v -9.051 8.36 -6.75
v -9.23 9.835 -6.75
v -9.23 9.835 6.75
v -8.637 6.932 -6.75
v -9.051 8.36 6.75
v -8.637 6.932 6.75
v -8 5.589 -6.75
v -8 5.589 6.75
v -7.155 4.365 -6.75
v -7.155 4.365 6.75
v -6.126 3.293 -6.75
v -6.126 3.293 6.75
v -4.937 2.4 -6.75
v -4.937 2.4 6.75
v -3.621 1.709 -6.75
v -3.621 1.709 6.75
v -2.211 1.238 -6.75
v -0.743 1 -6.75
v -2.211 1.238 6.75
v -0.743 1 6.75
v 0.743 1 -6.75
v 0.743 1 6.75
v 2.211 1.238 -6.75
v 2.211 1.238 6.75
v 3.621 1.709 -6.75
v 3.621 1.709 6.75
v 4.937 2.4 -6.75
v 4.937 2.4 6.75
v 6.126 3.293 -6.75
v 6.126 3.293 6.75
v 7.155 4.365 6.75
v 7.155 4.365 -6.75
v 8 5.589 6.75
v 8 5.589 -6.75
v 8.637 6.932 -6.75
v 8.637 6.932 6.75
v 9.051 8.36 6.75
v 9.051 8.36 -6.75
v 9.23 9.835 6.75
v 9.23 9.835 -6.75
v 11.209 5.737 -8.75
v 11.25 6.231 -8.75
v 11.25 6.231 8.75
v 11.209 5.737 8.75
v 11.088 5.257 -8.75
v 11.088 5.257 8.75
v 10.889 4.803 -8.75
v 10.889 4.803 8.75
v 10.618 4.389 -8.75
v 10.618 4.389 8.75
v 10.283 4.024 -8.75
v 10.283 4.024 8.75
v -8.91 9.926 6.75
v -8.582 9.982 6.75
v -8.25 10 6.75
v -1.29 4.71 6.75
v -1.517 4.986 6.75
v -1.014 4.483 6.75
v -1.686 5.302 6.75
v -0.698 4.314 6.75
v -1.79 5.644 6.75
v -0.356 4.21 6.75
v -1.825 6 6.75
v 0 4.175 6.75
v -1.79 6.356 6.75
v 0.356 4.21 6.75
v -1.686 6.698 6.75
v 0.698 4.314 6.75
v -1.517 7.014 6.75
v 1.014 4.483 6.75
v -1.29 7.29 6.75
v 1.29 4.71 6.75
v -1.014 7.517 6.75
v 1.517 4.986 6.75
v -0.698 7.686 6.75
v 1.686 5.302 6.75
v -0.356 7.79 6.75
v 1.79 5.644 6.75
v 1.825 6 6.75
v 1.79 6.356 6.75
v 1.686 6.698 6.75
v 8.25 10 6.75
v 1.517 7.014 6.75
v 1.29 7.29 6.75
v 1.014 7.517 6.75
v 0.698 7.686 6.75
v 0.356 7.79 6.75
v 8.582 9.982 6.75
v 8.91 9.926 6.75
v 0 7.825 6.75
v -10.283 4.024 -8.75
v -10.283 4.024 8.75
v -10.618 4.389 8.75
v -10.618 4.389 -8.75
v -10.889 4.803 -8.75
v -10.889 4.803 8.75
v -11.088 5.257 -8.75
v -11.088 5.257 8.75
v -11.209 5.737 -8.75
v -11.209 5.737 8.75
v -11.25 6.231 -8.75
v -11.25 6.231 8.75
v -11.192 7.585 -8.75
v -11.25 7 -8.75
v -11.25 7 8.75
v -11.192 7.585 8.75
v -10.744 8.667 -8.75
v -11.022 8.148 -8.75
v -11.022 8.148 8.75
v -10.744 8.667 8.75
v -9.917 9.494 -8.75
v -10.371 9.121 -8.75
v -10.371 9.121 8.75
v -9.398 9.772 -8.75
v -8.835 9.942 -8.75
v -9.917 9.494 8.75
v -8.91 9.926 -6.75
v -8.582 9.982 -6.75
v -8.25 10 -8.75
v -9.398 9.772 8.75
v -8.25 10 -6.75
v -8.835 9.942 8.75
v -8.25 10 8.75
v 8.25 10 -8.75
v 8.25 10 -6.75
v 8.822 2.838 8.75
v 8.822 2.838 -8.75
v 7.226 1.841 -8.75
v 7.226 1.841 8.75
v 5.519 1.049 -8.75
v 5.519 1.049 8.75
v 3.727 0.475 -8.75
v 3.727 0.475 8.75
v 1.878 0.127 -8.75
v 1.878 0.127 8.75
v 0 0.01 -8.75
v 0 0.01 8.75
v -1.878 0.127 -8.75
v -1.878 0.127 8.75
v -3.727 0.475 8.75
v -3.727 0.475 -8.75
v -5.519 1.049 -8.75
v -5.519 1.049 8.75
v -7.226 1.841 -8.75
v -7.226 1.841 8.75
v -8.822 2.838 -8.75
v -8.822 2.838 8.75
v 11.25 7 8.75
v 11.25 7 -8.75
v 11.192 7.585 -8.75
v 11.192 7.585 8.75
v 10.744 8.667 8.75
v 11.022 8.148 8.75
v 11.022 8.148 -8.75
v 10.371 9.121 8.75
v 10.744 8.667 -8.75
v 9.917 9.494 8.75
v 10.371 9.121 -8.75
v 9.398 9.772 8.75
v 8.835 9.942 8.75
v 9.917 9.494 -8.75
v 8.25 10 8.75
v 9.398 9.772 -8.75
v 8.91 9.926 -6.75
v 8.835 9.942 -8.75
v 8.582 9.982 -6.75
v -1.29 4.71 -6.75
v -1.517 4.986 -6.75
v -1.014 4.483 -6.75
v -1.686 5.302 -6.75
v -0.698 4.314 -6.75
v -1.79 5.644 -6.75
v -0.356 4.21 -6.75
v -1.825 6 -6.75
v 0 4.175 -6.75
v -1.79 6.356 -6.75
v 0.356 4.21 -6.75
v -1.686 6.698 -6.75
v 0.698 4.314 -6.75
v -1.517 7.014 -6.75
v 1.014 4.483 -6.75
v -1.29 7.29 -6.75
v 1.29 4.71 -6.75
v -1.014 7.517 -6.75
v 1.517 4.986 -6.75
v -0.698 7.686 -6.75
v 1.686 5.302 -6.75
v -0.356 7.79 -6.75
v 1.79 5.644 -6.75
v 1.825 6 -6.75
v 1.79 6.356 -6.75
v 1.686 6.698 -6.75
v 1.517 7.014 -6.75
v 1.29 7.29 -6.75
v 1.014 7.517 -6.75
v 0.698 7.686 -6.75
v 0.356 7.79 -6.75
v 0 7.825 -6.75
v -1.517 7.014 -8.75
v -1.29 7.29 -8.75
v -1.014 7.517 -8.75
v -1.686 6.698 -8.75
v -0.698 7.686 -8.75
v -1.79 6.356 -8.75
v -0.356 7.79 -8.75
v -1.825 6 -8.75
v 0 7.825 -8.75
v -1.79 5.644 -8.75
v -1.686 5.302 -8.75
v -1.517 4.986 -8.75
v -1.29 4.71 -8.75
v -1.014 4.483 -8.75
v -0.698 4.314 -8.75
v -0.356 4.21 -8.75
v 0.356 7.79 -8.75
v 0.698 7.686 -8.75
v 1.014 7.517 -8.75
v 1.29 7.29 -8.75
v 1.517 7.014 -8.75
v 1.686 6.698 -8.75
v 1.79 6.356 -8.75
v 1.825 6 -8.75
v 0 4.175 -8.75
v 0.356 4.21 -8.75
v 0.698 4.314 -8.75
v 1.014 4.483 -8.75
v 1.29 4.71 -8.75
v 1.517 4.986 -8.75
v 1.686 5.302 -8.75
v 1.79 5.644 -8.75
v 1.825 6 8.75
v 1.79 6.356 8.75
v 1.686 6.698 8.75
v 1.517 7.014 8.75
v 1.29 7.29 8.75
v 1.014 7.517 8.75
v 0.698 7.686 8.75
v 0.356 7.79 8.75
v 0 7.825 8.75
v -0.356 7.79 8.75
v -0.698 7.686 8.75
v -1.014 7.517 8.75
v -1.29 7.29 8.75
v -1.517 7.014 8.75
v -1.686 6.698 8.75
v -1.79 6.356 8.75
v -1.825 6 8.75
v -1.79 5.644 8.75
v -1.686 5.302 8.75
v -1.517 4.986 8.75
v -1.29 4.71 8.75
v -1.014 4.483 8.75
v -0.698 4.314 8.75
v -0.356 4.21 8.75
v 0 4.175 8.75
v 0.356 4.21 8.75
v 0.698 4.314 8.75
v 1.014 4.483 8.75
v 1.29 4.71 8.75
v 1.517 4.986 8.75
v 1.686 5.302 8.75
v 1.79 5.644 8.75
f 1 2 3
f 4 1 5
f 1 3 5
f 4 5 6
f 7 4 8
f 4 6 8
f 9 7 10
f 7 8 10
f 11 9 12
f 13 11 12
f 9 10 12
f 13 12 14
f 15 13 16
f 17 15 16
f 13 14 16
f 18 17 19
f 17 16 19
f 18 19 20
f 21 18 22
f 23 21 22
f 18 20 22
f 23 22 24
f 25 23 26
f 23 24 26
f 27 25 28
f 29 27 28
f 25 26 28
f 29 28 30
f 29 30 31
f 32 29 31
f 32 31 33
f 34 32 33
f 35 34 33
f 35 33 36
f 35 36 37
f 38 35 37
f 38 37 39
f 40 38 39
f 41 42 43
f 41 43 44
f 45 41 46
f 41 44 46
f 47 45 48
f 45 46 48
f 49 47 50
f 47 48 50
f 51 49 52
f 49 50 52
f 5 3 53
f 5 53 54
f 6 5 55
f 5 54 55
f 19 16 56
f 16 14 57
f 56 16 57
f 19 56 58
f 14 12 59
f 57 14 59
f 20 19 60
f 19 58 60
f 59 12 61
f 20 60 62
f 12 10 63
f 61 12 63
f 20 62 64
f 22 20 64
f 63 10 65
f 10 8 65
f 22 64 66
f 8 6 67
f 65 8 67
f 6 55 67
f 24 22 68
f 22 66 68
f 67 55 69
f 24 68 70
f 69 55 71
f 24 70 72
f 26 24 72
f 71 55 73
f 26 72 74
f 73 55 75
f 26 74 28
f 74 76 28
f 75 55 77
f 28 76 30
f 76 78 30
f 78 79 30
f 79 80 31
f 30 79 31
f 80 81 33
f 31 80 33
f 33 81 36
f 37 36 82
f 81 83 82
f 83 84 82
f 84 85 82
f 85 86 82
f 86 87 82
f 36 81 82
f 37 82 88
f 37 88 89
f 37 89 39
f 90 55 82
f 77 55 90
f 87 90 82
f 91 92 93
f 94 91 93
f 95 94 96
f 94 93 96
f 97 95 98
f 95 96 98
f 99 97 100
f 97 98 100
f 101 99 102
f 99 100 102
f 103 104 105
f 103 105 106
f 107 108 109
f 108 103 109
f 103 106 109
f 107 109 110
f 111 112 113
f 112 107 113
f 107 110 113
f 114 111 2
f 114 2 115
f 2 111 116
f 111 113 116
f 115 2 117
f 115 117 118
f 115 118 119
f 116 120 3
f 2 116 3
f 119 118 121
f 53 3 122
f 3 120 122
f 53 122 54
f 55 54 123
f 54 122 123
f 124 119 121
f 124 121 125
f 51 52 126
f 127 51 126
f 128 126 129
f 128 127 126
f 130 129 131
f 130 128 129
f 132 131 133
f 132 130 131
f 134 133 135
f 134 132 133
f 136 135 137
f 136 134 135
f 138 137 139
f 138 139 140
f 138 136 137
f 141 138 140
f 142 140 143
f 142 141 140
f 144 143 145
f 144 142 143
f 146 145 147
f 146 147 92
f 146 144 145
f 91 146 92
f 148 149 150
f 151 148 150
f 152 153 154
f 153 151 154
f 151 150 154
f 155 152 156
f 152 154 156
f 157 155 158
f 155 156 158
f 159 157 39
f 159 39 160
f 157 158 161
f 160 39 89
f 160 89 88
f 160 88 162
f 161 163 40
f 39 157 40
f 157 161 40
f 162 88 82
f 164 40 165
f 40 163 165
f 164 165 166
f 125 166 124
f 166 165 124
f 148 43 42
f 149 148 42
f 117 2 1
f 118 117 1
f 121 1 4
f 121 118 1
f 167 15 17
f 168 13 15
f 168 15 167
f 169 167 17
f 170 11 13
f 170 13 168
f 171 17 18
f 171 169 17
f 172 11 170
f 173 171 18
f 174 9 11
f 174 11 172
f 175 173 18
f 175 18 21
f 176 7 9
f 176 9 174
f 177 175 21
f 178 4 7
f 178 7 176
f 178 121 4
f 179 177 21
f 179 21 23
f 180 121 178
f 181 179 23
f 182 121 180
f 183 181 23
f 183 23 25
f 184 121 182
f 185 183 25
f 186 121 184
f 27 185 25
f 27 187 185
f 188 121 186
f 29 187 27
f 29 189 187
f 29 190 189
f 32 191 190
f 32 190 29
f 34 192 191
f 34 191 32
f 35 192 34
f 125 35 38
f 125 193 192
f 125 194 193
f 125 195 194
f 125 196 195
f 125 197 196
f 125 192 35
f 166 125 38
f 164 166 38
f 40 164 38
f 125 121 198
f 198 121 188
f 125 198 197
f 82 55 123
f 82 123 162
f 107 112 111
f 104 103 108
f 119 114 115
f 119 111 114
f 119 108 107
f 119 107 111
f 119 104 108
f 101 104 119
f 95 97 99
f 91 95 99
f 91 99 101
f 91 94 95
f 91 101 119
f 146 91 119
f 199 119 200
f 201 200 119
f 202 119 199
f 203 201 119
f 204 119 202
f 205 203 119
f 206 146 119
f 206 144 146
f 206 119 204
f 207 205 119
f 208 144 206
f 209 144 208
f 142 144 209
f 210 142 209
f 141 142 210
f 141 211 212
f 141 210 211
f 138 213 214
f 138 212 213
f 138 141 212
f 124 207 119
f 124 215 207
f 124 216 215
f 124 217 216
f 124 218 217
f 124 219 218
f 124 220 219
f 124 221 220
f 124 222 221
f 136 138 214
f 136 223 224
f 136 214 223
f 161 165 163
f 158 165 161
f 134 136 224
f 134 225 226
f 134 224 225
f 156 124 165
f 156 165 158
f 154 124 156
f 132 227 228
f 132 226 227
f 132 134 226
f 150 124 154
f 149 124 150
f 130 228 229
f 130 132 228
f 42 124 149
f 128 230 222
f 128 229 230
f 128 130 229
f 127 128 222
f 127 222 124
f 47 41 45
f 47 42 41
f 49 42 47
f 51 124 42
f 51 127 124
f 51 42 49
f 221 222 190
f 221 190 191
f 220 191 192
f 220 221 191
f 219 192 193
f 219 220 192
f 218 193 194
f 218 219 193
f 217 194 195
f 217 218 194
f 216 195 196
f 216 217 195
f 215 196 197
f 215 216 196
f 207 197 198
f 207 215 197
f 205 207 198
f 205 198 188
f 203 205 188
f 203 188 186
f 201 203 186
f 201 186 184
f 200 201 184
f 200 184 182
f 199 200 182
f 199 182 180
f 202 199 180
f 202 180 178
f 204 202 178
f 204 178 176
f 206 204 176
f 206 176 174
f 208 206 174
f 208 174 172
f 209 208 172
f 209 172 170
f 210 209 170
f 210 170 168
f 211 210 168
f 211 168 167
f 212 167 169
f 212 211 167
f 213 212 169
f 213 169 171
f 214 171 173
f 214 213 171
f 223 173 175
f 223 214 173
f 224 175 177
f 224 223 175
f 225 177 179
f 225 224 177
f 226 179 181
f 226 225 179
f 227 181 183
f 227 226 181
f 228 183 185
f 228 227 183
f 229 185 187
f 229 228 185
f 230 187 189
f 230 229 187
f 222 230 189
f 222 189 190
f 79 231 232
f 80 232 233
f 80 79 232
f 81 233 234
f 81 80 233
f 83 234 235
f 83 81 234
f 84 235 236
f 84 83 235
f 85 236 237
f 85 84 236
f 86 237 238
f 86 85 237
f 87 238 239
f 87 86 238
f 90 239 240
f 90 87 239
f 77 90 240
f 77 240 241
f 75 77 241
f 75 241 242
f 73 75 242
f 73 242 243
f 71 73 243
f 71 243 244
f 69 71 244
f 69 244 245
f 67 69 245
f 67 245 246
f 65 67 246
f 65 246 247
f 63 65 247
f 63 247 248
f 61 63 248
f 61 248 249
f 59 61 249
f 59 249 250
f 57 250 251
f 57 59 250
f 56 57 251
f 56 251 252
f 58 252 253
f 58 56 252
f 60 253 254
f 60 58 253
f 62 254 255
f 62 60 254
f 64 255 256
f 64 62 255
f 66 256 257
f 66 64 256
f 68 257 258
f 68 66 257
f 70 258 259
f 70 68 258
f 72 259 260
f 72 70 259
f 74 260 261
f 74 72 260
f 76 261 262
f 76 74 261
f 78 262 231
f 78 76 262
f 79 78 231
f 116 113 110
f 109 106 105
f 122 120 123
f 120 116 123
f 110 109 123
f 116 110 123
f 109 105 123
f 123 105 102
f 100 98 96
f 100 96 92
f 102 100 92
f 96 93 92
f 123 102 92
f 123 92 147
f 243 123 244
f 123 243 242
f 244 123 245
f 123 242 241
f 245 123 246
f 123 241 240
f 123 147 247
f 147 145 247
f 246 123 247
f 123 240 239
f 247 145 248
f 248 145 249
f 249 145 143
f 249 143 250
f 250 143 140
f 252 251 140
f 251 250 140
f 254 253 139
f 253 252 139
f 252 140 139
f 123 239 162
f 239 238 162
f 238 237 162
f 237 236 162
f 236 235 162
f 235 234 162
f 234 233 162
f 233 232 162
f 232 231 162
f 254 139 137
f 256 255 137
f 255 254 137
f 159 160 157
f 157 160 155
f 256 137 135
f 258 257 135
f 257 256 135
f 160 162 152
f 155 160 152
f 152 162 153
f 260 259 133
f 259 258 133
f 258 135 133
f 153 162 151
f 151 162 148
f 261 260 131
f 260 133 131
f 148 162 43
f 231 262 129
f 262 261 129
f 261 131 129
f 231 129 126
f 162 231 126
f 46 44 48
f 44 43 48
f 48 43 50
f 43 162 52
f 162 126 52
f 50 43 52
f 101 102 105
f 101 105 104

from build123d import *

# Parameters (mm, degrees)
SKETCH1_W               = 22.5
SKETCH1_H               = 17.5
BOSS_EXTRUDE1_DEPTH     = 10
CUT_EXTRUDE1_DEPTH      = 24.082731641
CUT_EXTRUDE1_DEPTH_BACK = 24.082731641
SKETCH2_R               = 1.825
CUT_EXTRUDE2_DEPTH      = 13.5
CUT_EXTRUDE3_REACH      = 19.405
SKETCH4_W               = 11.529065942
SKETCH4_H               = 13.5
FILLET1_R               = 3


with BuildPart() as part:
    # Sketch1 → Boss-Extrude1 (new body)
    with BuildSketch(Plane(origin=(0, 0, 0), x_dir=(1, 0, 0), z_dir=(0, 1, 0))):
        Rectangle(SKETCH1_W, SKETCH1_H)
    extrude(amount=BOSS_EXTRUDE1_DEPTH)

    # Sketch2 → Cut-Extrude1 (cut, two sides: drawn at the far end of the back side and taken through both)
    with BuildSketch(Plane.XY.offset(8.75).offset(-CUT_EXTRUDE1_DEPTH_BACK)):
        with Locations((0, 6)):
            Circle(SKETCH2_R)
        with BuildLine():
            Line((-11.25, 5), (-11.25, 0))
            Line((-11.25, 0), (11.25, 0))
            Line((11.25, 0), (11.25, 5))
            ThreePointArc((11.25, 5), (0, 0.01), (-11.25, 5))
        make_face()
    extrude(amount=CUT_EXTRUDE1_DEPTH + CUT_EXTRUDE1_DEPTH_BACK, mode=Mode.SUBTRACT)

    # Sketch3 → Cut-Extrude2 (cut)
    with BuildSketch(Plane.XY.offset(6.75)):
        with BuildLine():
            ThreePointArc((-9.233945582, 9.952114837), (0, 0.969656164), (9.233945582, 9.952114837))
            ThreePointArc((9.233945582, 9.952114837), (7.547885163, 11.733945582), (5.766054418, 10.047885163))
            ThreePointArc((5.766054418, 10.047885163), (0, 4.438869486), (-5.766054418, 10.047885163))
            ThreePointArc((-5.766054418, 10.047885163), (-7.547885163, 11.733945582), (-9.233945582, 9.952114837))
        make_face()
    extrude(amount=-CUT_EXTRUDE2_DEPTH, mode=Mode.SUBTRACT)

    # Sketch4 → Cut-Extrude3 (cut, up to next)
    with BuildSketch(Plane(origin=(0, 10, 0), x_dir=(1, 0, 0), z_dir=(0, 1, 0)), mode=Mode.PRIVATE) as cut_extrude3_sk1:
        Rectangle(SKETCH4_W, SKETCH4_H)
    cut_extrude3_tool1 = extrude(cut_extrude3_sk1.sketch, amount=-CUT_EXTRUDE3_REACH, mode=Mode.PRIVATE) & part.part
    add(cut_extrude3_tool1.solids().sort_by_distance((0, 10, 0))[0], mode=Mode.SUBTRACT)

    # Fillet1
    # the kernel refuses this fillet: 3 mm, written as the material it takes off along each edge
    with BuildSketch(Plane(origin=(11.25, 5, 12.185069568), x_dir=(0, 1, 0), z_dir=(0, 0, -1))) as fillet1_piece_1:
        with BuildLine():
            CenterArc((1.230754269, -3), FILLET1_R, 90, 47.349204062)
            ThreePointArc((-0.975735859, -0.967415115), (-0.498821765, -0.472659508), (0, 0))
            Line((0, 0), (1.230754269, 0))
        make_face()
    extrude(amount=24.370139136, mode=Mode.SUBTRACT)
    with BuildSketch(Plane(origin=(-11.25, 5, 12.185069568), x_dir=(0, 1, 0), z_dir=(0, 0, -1))) as fillet1_piece_2:
        with BuildLine():
            CenterArc((1.230754269, 3), FILLET1_R, 222.650795938, 47.349204062)
            ThreePointArc((-0.975735859, 0.967415115), (-0.498821765, 0.472659508), (0, 0))
            Line((0, 0), (1.230754269, 0))
        make_face()
    extrude(amount=24.370139136, mode=Mode.SUBTRACT)
    with BuildSketch(Plane(origin=(11.25, 10, -16.25), x_dir=(-1, 0, 0), z_dir=(0, 0, 1))) as fillet1_piece_3:
        with BuildLine():
            CenterArc((FILLET1_R, FILLET1_R), FILLET1_R, 180, 90)
            Line((0, FILLET1_R), (0, 0))
            Line((0, 0), (FILLET1_R, 0))
        make_face()
    extrude(amount=32.5, mode=Mode.SUBTRACT)
    with BuildSketch(Plane(origin=(-11.25, 10, 16.25), x_dir=(0, -1, 0), z_dir=(0, 0, -1))) as fillet1_piece_4:
        with BuildLine():
            CenterArc((FILLET1_R, -FILLET1_R), FILLET1_R, 90, 90)
            Line((0, -FILLET1_R), (0, 0))
            Line((0, 0), (FILLET1_R, 0))
        make_face()
    extrude(amount=32.5, mode=Mode.SUBTRACT)


solid = part.part
